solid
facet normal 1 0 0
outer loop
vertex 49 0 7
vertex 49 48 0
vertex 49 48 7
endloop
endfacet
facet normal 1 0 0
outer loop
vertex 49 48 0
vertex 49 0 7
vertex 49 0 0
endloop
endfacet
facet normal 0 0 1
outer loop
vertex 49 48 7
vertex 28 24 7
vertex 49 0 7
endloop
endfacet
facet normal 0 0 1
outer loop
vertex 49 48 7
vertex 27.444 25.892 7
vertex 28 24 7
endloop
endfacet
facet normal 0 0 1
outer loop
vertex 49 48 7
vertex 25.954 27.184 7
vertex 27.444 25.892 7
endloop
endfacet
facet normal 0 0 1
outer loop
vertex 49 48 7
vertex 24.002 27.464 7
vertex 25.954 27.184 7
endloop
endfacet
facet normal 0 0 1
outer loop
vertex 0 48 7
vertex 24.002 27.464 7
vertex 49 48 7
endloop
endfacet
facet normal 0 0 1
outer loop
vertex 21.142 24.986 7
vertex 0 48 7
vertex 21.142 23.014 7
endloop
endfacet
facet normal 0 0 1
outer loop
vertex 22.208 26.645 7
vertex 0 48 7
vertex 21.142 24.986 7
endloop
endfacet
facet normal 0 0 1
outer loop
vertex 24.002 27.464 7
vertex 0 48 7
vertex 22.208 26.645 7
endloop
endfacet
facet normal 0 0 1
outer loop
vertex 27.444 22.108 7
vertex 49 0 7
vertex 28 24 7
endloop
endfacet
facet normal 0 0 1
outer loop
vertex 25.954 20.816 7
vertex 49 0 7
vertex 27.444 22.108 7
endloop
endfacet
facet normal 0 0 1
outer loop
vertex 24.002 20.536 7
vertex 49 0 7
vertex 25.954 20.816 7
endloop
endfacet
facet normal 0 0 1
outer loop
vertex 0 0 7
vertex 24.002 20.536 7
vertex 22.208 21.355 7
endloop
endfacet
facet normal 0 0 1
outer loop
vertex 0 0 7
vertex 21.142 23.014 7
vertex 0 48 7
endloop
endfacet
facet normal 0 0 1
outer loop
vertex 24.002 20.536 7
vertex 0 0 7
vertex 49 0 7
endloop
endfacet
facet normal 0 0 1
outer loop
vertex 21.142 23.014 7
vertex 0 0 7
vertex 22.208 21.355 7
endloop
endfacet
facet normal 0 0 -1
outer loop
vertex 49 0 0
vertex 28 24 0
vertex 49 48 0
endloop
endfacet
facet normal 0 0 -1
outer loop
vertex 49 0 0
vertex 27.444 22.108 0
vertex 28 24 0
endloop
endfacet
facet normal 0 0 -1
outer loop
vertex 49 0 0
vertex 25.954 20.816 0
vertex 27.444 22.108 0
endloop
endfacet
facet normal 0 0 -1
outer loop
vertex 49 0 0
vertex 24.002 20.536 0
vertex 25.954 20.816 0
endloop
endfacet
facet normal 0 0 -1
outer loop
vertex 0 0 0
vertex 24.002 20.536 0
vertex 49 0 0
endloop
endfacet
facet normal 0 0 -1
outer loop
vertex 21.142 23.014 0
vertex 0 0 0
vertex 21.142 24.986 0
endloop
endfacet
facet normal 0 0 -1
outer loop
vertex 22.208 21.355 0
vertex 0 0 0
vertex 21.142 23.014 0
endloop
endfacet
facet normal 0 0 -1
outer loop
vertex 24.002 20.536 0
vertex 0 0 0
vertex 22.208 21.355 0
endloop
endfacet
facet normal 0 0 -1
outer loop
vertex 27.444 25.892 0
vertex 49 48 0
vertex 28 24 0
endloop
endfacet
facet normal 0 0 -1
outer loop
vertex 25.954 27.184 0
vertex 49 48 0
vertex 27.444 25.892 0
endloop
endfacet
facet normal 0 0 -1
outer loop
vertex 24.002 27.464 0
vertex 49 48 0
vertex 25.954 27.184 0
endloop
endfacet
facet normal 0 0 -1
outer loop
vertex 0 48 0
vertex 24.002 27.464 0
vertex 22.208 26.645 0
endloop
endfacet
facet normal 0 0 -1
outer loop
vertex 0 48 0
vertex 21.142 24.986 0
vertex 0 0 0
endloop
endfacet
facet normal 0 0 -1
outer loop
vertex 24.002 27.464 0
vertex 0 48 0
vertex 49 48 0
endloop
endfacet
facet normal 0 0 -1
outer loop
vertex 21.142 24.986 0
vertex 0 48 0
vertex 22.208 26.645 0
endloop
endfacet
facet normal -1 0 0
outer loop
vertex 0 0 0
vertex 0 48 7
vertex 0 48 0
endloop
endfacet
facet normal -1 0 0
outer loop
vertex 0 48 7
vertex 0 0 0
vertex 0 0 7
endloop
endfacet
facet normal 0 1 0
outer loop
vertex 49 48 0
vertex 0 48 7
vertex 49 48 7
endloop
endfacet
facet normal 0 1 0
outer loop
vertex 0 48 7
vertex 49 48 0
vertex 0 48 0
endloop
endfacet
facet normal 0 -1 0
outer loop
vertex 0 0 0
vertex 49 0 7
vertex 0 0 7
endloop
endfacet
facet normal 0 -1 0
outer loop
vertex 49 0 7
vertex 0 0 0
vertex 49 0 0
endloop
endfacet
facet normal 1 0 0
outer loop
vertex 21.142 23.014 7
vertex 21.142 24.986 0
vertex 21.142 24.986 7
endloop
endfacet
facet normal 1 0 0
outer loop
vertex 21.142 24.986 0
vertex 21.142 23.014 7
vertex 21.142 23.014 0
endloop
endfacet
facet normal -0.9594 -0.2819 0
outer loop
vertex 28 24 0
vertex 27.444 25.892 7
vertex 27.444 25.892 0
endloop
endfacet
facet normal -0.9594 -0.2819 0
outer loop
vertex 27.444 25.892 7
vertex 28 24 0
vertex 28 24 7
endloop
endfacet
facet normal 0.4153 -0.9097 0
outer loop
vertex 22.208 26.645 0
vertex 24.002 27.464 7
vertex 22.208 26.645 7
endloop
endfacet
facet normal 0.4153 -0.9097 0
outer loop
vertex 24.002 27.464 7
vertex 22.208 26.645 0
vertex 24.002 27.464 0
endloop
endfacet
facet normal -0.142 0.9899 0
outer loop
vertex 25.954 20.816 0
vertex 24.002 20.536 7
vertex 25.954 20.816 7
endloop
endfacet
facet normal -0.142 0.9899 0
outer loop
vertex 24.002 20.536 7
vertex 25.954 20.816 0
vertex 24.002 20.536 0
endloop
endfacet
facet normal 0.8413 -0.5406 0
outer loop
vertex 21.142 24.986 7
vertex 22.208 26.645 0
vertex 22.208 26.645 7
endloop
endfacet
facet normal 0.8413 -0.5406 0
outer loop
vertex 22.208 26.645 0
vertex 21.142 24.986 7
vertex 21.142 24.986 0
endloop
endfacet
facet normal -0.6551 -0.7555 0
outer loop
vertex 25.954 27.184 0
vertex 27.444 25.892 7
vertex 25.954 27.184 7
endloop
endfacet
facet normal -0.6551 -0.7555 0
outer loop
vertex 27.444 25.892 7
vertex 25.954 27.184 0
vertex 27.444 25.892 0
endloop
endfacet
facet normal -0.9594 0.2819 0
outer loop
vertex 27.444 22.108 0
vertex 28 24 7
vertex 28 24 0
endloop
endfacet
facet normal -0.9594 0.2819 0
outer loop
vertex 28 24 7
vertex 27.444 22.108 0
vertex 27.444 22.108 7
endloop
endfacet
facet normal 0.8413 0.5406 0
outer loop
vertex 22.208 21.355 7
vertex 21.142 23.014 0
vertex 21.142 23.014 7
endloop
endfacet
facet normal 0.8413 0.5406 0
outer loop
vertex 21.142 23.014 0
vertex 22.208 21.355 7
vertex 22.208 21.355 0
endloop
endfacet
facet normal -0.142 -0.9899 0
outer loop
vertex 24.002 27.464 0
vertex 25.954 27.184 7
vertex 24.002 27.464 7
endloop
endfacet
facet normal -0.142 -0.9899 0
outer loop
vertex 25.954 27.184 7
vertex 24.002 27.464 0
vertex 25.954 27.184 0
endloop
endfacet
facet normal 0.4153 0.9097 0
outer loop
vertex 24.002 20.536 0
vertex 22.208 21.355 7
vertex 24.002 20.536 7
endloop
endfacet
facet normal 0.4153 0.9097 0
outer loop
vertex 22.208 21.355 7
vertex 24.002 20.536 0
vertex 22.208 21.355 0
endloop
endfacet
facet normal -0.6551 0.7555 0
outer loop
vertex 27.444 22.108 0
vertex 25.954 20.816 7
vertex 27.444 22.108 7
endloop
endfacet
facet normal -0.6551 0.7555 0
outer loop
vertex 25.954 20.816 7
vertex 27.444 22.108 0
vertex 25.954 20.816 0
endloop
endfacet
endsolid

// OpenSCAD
x = 49;
y = 48;
z = 7;

d = 7;

difference() {
cube([x, y, z]);
translate([0.5*x, 0.5*y, 0]) cylinder(d=d, h=z);
}
